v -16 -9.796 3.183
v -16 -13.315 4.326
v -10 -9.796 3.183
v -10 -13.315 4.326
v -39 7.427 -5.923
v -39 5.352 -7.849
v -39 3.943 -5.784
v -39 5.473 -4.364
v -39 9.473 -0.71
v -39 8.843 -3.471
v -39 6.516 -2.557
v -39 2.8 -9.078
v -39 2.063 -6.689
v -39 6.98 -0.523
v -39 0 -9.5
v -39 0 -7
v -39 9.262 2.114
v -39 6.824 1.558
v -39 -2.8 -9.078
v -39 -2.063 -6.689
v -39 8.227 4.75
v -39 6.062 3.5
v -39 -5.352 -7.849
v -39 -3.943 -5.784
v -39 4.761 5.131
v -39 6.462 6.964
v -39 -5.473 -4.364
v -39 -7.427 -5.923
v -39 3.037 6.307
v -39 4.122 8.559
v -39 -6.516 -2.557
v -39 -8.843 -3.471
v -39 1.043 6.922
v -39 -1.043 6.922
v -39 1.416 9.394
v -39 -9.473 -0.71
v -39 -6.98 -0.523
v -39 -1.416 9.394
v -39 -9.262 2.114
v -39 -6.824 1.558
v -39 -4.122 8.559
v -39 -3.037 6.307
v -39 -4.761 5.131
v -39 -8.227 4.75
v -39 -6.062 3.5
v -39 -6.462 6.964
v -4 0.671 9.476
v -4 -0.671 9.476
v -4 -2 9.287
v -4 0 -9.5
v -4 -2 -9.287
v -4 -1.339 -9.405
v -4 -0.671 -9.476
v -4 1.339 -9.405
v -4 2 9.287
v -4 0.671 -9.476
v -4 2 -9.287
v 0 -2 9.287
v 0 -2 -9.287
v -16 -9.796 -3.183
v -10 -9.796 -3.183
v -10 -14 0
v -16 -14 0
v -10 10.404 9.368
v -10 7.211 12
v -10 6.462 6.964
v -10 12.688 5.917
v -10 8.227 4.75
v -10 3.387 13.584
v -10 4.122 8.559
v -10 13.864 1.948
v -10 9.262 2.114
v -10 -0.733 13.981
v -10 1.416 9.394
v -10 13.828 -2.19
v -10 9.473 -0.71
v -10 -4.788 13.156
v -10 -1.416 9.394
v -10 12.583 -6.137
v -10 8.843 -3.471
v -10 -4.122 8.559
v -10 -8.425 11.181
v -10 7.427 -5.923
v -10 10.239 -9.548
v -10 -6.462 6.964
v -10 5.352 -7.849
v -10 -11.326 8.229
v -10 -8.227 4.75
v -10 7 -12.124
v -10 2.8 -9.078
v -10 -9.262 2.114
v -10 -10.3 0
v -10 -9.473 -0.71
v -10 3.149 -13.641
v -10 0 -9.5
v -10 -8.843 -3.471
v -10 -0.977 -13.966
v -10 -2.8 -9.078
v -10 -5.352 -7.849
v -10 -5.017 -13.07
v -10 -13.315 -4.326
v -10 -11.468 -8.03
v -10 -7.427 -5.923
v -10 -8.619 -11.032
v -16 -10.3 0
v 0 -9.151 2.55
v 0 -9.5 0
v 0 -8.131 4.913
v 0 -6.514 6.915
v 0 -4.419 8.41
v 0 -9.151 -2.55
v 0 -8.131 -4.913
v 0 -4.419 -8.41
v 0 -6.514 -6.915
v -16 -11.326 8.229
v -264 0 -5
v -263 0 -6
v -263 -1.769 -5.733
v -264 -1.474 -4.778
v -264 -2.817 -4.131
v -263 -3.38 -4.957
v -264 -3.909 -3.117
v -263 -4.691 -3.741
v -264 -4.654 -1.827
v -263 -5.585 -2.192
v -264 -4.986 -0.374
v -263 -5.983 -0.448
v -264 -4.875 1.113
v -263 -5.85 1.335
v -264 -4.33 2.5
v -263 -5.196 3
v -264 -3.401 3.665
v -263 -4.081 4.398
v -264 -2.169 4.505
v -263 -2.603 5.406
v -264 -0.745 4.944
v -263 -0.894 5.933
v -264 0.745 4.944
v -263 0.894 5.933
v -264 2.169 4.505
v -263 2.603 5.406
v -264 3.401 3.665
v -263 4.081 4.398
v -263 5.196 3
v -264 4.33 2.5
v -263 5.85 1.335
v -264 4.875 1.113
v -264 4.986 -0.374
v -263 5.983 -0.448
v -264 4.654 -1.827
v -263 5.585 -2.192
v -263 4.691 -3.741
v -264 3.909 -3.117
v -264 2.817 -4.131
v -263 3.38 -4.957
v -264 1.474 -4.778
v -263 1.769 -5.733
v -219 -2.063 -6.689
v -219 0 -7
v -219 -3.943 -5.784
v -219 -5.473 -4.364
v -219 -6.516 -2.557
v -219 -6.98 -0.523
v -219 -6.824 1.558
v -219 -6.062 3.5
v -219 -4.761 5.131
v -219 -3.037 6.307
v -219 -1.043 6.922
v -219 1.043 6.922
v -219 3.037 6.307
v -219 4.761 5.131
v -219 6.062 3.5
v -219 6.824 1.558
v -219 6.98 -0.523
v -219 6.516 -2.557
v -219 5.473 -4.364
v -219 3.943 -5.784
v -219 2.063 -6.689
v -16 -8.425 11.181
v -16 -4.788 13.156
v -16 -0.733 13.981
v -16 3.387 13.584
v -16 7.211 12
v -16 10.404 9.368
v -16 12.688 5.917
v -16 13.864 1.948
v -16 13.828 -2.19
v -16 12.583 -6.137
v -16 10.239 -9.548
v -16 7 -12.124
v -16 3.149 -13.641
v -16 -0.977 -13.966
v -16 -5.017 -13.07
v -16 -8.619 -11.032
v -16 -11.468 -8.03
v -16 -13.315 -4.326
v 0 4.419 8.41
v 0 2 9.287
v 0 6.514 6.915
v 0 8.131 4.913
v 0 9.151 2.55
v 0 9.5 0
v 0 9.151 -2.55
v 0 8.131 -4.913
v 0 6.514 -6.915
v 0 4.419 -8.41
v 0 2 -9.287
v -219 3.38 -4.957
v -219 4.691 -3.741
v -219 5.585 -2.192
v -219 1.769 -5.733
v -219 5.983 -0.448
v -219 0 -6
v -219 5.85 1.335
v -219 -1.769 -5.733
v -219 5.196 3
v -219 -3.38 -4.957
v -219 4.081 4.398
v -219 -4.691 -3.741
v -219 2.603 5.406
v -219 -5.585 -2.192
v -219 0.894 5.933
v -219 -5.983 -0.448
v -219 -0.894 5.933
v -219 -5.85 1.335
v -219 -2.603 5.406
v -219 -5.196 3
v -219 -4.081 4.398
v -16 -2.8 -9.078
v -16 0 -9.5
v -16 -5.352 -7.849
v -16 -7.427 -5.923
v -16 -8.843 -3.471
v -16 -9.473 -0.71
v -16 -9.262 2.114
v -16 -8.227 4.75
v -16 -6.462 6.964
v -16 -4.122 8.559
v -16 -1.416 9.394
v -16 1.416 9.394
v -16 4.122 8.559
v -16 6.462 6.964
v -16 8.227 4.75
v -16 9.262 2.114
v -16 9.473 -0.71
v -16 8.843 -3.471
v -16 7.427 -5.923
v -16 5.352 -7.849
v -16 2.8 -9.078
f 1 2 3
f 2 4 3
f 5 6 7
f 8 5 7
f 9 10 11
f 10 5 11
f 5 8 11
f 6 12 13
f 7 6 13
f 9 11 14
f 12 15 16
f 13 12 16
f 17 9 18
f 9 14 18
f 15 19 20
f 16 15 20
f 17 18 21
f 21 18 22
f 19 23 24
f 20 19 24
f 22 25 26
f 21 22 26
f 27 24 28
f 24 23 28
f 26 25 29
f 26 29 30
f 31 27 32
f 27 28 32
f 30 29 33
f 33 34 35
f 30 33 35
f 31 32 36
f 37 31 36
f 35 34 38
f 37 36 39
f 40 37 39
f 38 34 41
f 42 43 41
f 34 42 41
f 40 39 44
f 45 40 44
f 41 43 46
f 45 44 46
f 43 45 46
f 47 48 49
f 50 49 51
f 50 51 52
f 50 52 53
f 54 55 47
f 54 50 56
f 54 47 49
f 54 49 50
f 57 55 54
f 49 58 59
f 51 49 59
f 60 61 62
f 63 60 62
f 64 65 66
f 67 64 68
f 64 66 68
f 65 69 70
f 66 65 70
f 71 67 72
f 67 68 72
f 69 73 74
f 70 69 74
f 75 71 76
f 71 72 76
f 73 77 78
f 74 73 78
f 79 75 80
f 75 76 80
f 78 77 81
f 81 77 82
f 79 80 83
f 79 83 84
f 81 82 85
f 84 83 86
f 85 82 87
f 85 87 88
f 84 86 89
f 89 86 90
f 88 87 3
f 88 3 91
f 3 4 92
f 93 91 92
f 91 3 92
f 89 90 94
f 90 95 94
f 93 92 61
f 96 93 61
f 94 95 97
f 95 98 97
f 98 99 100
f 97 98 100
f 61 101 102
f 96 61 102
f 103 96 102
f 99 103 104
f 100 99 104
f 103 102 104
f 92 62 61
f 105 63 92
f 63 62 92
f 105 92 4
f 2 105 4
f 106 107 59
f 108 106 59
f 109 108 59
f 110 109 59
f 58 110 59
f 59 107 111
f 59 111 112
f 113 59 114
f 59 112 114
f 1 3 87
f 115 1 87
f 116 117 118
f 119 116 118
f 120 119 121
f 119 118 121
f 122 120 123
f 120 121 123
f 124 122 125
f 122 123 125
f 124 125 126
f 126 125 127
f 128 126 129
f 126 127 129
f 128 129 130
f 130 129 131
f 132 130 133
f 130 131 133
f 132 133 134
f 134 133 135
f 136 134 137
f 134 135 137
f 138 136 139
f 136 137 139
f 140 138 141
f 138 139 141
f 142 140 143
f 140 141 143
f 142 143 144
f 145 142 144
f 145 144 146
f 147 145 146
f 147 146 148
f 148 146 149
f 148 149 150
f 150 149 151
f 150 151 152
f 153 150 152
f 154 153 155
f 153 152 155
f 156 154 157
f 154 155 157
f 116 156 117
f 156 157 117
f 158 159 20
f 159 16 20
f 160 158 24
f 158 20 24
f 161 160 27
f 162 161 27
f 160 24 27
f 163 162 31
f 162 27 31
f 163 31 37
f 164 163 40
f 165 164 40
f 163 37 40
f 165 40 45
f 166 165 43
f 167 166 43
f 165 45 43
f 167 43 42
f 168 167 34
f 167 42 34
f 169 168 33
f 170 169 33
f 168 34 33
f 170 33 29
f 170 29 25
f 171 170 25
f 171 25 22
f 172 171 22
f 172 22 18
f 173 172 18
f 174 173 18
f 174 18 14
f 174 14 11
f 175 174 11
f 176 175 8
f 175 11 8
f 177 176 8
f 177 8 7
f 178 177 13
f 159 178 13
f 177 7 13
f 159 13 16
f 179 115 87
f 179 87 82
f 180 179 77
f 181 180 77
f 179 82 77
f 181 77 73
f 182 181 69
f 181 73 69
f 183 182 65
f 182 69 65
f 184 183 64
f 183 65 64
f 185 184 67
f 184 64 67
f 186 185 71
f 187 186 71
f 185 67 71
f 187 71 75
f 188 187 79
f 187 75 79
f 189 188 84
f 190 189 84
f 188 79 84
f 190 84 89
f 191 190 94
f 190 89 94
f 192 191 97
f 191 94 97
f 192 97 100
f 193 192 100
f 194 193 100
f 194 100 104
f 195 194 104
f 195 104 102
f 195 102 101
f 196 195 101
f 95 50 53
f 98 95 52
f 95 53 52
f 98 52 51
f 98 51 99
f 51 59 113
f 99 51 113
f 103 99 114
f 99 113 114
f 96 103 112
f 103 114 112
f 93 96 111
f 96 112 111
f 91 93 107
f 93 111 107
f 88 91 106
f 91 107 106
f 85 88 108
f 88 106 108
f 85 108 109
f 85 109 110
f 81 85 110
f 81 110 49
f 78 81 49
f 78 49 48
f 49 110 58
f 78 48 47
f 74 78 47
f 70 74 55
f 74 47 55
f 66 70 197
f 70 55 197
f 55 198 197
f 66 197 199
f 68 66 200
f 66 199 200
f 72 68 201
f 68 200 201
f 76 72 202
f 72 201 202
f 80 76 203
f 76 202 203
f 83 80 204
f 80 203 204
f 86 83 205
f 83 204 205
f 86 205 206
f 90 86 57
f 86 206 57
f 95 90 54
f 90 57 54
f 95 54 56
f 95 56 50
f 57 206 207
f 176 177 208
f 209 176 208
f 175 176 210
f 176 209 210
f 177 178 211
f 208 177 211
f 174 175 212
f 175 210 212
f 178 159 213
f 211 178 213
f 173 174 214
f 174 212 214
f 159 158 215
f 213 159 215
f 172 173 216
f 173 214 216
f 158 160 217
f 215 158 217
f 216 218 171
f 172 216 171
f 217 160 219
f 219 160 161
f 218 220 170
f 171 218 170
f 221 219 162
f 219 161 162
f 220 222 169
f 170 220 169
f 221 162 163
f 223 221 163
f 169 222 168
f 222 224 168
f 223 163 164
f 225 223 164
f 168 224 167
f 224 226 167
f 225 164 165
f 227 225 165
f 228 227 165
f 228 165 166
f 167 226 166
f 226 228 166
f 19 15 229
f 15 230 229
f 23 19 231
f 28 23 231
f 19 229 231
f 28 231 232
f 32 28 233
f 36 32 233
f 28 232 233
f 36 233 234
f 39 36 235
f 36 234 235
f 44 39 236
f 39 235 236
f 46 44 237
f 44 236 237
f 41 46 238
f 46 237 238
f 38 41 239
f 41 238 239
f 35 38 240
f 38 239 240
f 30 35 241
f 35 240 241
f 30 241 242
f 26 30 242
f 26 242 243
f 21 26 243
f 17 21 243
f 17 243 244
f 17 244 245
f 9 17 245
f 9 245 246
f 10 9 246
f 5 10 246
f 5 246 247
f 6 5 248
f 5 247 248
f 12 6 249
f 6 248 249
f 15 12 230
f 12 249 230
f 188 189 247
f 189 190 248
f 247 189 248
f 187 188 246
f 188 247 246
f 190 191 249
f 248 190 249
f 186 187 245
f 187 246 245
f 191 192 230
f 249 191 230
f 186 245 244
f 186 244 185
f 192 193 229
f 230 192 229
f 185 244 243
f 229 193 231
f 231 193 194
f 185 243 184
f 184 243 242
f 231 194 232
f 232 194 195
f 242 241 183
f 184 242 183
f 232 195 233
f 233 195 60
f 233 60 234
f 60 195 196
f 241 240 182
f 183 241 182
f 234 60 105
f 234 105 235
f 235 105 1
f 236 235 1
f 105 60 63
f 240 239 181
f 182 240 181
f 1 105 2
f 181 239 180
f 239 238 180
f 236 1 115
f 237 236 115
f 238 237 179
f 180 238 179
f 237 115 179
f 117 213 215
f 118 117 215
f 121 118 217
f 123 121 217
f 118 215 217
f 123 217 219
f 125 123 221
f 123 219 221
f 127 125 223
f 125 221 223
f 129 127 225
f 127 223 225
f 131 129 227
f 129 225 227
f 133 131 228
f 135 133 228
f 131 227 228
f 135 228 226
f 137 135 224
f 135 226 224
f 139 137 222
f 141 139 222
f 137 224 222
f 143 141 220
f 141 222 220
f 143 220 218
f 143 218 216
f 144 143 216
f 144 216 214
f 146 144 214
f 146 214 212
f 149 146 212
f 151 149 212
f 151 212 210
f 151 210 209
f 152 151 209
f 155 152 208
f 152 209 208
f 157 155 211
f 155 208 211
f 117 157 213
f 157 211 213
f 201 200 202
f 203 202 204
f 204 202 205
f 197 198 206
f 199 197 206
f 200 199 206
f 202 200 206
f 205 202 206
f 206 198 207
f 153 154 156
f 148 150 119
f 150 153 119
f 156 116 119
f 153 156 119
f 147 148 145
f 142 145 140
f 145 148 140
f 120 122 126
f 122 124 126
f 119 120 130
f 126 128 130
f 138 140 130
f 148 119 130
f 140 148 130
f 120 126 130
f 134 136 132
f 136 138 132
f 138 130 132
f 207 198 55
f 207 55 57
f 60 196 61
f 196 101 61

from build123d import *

# Parameters (mm, degrees)
CHAMFER_1_SIZE           = 1
SKETCH_2_W               = 19
SKETCH_2_H               = 4
CUT_EXTRUDE_1_DEPTH      = 4
CUT_EXTRUDE_3_DEPTH      = 255.770484947
PATTERN_CIRCULAR_1_COUNT = 2
PATTERN_CIRCULAR_1_ANGLE = 18
F_1_THE_OTHER_WAY_COUNT  = 2
F_1_THE_OTHER_WAY_ANGLE  = 18


with BuildPart() as part:
    # 草图1 → 旋转1 (revolve)
    with BuildSketch(Plane.XY, mode=Mode.PRIVATE) as revolve_1_sk:
        Polygon((-264, 0), (-264, 6), (-219, 6), (-219, 7), (-39, 7), (-39, 9.5), (-16, 9.5), (-16, 14), (-10, 14), (-10, 9.5), (0, 9.5), (0, 0), align=None)
    revolve(revolve_1_sk.sketch.rotate(Axis((0, 0, 0), (-1, 0, 0)), 90), axis=Axis((0, 0, 0), (-1, 0, 0)))

    # 倒角1
    chamfer_1_edges = [part.edges().sort_by_distance(p)[0] for p in [
        (-264, 0, 6),
    ]]
    chamfer(chamfer_1_edges, length=CHAMFER_1_SIZE)

    # 草图2 → 切除-拉伸-薄壁1 (cut)
    with BuildSketch(Plane(origin=(0, 0, 0), x_dir=(0, 0, -1), z_dir=(1, 0, 0))):
        Rectangle(SKETCH_2_W, SKETCH_2_H)
    extrude(amount=-CUT_EXTRUDE_1_DEPTH, mode=Mode.SUBTRACT)

    # 草图4 → 切除-拉伸3 (cut, symmetric)
    with BuildSketch(Plane(origin=(-10, 0, 0), x_dir=(0, 0, -1), z_dir=(1, 0, 0))):
        Polygon((0, -89.785980761), (0, -14), (0, -10.3), (-4.326237921, -13.314791228), (-66.504055872, -56.644155807), (-134.109197976, -192.304040375), (-67.605142103, -225.445865329), align=None)
    cut_extrude_3 = extrude(amount=CUT_EXTRUDE_3_DEPTH, both=True, mode=Mode.SUBTRACT)

    # 阵列(圆周)1: 切除-拉伸3 ×2 about axis
    pattern_circular_1_axis = Axis((0, 0, 0), (1, 0, 0))
    for i in range(1, PATTERN_CIRCULAR_1_COUNT):
        add(cut_extrude_3.rotate(pattern_circular_1_axis, i * PATTERN_CIRCULAR_1_ANGLE / (PATTERN_CIRCULAR_1_COUNT - 1)), mode=Mode.SUBTRACT)

    # 1 the other way: 切除-拉伸3 ×2 about axis
    f_1_the_other_way_axis = Axis((0, 0, 0), (-1, 0, 0))
    for i in range(1, F_1_THE_OTHER_WAY_COUNT):
        add(cut_extrude_3.rotate(f_1_the_other_way_axis, i * F_1_THE_OTHER_WAY_ANGLE / (F_1_THE_OTHER_WAY_COUNT - 1)), mode=Mode.SUBTRACT)


solid = part.part
